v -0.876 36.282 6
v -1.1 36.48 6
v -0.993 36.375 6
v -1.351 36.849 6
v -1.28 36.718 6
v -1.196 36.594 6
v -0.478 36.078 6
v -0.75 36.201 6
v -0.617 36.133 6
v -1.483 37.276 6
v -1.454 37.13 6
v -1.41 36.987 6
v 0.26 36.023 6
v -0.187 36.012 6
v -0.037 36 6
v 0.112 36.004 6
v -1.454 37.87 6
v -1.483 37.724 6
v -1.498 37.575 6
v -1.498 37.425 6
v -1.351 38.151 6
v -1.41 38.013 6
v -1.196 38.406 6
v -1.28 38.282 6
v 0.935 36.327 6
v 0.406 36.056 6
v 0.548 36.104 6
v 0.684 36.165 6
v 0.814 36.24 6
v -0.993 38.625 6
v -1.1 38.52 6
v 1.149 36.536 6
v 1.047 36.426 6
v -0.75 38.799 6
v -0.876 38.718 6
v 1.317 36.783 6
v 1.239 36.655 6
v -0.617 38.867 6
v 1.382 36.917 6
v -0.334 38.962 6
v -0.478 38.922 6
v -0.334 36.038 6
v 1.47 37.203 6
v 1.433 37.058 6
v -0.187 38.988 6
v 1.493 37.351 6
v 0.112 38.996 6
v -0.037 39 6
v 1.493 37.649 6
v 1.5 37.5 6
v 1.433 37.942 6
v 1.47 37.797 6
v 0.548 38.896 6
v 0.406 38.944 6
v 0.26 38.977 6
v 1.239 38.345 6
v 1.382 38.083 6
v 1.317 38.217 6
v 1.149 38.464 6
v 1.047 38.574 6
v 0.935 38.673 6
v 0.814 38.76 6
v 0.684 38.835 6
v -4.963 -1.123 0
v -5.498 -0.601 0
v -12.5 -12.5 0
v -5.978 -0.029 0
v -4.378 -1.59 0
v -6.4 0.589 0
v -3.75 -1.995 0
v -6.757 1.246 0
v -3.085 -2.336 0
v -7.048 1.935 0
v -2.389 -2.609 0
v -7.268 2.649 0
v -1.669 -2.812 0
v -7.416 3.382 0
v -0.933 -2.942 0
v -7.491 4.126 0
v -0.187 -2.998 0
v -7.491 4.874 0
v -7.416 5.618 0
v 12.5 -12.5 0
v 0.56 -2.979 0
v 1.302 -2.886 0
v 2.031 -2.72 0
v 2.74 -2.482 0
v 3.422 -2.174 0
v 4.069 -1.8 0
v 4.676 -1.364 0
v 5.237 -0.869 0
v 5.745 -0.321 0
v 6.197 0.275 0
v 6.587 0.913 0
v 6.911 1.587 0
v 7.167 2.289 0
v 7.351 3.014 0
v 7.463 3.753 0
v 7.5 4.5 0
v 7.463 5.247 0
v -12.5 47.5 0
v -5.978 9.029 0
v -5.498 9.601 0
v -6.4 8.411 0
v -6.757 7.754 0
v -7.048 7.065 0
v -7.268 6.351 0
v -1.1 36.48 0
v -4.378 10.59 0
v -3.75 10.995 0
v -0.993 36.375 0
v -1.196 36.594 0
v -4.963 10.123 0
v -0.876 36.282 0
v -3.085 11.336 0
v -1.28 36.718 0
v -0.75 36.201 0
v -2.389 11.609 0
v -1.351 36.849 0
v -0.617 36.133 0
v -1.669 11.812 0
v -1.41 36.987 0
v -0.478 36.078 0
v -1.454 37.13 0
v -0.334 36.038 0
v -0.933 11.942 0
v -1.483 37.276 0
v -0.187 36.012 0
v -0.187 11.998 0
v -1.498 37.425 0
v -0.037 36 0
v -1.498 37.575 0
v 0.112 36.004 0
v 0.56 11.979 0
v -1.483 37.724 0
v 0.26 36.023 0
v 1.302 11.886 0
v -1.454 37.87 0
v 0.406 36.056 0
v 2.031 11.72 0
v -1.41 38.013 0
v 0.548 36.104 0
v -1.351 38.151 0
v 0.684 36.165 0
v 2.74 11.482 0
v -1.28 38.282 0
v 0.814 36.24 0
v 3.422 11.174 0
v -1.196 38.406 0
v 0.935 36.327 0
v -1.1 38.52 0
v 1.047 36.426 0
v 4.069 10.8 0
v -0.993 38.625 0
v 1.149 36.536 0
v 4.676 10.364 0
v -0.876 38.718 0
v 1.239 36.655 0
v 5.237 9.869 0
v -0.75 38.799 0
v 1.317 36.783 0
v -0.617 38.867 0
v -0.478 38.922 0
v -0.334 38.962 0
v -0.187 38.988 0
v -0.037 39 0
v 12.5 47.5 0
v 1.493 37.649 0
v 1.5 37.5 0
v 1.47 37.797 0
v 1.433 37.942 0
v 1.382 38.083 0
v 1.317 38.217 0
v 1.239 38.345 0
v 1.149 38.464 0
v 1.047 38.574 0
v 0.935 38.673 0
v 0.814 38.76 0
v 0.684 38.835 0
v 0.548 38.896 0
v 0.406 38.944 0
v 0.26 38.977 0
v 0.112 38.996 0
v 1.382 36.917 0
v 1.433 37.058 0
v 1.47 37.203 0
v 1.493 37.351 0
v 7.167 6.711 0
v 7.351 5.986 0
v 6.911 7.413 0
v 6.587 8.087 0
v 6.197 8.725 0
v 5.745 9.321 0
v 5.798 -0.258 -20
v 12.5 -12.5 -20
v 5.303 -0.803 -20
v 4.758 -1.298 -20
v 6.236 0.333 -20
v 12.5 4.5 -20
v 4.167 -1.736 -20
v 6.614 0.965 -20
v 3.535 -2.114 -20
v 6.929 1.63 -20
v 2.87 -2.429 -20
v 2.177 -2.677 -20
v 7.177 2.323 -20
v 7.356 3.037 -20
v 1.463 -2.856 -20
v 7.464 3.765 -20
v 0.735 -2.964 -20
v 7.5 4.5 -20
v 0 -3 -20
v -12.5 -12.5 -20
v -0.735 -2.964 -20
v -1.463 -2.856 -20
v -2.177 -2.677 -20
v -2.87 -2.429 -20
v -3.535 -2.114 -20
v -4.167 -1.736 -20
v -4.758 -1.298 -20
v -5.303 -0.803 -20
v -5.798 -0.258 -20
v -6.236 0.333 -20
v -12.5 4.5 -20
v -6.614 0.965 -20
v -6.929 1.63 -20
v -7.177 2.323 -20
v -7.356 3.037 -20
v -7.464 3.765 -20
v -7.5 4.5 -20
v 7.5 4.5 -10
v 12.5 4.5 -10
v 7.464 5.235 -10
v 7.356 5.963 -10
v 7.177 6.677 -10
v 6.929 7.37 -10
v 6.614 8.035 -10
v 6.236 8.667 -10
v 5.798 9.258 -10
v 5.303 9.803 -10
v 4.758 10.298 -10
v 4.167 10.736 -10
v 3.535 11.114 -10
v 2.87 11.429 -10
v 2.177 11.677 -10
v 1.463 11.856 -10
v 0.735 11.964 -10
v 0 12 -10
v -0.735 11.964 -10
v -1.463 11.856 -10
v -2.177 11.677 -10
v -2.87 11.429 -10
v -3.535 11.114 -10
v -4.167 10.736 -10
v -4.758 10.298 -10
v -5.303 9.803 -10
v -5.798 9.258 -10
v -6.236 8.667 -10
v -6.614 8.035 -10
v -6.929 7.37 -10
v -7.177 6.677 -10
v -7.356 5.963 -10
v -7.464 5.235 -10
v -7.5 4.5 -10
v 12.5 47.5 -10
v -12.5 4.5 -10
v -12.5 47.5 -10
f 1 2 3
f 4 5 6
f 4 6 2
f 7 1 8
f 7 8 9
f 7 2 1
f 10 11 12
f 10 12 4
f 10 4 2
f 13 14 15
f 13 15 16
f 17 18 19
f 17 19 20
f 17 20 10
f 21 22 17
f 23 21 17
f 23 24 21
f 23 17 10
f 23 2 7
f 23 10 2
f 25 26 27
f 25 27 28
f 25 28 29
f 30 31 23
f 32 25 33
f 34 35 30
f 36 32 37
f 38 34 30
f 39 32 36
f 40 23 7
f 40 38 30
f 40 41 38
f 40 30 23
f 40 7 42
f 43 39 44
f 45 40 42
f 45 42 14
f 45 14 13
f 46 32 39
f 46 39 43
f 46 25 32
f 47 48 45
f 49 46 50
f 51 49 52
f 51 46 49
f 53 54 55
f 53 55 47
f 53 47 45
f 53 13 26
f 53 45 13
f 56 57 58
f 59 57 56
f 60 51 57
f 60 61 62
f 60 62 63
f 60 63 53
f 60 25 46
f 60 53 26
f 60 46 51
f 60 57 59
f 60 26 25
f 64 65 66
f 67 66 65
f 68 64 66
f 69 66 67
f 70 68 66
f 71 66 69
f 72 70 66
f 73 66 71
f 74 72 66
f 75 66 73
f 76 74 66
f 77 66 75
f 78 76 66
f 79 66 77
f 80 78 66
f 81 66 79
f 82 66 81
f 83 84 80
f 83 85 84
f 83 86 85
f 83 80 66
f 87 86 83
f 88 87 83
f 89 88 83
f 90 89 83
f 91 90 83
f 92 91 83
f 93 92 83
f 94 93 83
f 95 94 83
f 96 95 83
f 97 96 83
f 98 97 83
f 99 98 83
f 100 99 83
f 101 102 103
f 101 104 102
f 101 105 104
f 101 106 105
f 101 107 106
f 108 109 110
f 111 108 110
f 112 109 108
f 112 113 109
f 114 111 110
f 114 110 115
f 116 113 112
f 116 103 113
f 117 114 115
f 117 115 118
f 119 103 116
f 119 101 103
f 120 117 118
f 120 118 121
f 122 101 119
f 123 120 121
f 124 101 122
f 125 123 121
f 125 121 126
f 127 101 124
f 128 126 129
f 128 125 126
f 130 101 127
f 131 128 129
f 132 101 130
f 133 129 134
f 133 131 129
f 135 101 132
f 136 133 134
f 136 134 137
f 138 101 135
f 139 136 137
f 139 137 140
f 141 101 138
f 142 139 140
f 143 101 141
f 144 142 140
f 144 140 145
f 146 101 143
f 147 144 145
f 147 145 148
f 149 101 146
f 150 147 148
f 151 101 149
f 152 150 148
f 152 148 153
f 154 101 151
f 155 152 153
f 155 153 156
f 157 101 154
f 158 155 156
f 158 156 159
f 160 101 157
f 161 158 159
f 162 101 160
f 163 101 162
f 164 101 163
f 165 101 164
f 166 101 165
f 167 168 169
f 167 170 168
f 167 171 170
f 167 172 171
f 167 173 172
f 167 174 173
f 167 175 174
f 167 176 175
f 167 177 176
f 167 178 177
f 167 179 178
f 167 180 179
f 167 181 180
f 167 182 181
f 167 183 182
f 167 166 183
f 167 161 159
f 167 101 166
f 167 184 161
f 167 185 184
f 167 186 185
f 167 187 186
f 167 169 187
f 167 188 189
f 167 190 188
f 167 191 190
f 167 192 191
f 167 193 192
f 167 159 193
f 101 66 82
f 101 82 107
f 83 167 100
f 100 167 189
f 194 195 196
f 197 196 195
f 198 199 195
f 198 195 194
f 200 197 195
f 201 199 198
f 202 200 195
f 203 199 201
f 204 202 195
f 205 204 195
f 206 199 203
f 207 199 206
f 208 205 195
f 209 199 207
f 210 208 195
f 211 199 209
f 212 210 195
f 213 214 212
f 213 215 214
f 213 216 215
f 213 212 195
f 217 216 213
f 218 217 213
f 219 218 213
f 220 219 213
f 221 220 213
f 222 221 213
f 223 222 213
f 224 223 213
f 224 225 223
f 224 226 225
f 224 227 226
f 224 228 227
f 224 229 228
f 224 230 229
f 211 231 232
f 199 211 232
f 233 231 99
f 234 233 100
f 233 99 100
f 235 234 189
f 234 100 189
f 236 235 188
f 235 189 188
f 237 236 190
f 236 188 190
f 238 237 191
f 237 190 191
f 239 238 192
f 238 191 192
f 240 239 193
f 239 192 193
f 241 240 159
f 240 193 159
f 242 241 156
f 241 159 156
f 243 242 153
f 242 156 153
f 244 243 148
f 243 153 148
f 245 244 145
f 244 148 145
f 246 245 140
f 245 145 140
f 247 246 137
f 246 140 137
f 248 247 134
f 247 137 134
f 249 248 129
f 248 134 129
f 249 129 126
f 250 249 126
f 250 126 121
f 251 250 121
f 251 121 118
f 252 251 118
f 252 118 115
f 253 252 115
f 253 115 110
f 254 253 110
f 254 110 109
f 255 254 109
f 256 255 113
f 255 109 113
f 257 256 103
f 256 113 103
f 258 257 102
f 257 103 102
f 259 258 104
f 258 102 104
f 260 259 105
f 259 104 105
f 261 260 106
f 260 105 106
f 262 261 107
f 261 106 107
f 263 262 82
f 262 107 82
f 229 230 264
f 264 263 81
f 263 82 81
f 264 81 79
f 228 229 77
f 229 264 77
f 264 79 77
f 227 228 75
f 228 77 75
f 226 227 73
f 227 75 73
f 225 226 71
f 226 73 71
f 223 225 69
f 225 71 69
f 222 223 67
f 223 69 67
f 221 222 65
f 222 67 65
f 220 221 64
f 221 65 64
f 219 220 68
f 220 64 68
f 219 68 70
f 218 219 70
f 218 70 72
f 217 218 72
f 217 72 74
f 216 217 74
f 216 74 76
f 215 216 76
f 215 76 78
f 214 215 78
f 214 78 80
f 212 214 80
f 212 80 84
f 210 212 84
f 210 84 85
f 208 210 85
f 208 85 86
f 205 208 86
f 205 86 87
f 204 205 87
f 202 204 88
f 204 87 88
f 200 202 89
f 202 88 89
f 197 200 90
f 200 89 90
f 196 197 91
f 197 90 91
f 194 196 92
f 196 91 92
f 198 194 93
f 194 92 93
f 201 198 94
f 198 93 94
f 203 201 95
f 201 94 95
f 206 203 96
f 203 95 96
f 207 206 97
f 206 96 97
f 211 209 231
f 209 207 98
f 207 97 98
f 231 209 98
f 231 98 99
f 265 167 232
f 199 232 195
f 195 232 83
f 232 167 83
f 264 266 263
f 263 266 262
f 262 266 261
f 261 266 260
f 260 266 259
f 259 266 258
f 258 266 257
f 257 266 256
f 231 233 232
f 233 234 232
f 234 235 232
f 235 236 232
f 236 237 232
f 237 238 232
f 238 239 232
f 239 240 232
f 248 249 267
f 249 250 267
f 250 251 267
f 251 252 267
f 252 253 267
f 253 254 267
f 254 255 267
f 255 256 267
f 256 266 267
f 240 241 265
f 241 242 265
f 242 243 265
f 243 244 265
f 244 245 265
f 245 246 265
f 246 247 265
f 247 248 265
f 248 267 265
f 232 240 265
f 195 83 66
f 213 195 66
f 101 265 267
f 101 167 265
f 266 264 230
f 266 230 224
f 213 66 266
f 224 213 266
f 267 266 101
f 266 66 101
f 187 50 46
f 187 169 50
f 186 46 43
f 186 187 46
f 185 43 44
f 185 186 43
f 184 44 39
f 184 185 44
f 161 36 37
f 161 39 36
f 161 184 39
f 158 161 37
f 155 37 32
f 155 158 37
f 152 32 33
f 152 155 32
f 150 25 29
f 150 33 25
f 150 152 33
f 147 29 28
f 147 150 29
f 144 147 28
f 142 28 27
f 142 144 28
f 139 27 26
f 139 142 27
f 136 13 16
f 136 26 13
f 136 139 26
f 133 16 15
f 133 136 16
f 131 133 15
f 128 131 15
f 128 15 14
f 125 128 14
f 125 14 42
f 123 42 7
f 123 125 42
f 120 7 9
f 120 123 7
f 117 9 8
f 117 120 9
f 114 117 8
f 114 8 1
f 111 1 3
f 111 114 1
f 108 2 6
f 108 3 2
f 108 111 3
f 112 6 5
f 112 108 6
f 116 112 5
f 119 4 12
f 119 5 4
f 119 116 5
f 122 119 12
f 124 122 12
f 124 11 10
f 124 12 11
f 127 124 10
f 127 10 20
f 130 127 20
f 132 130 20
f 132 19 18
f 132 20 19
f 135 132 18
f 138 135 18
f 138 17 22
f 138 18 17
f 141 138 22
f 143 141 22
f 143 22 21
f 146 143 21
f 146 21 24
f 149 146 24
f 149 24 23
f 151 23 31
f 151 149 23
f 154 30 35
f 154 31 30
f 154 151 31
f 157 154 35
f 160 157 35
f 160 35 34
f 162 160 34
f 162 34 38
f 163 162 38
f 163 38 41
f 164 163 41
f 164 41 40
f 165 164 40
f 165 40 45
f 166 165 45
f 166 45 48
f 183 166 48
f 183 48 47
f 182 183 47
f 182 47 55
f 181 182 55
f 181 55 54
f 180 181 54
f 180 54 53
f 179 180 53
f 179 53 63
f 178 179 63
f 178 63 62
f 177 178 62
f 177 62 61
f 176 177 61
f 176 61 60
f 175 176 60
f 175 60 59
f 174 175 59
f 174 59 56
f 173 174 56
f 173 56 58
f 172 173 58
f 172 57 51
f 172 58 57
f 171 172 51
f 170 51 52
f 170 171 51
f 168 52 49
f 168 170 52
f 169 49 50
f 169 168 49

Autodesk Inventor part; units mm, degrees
ref_plane "YZ Plane" through (0, 0, 0) normal (1, 0, 0) x (0, 1, 0)
ref_plane "XZ Plane" through (0, 0, 0) normal (0, 1, 0) x (-1, 0, 0)
ref_plane "XY Plane" through (0, 0, 0) normal (0, 0, 1) x (1, 0, 0)
sketch "Sketch1" plane through (0, 0, 0) normal (0, 0, 1) x (1, 0, 0)
  line L0 (-12.5, -12.5) -> (12.5, -12.5)
  line L1 (12.5, -12.5) -> (12.5, 47.5)
  line L2 (12.5, 47.5) -> (-12.5, 47.5)
  line L3 (-12.5, 47.5) -> (-12.5, -12.5)
  point P0 (0, 0)
  dimension "d0" = 60
  dimension "d1" = 25
  dimension "d2" = 12.5
  dimension "d5" = 12.5
extrude "Extrusion1" add sketch "Sketch1" against normal blind 10
sketch "Sketch2" plane through (0, 0, 0) normal (0, 0, 1) x (1, 0, 0)
  circle A0 centre (0, 37.5) radius 1.5
  point P0 (0, 0)
  dimension "d8" = 3
  dimension "d29" = 37.5
extrude "Extrusion2" add sketch "Sketch2" along normal blind 6
thread "Thread1" size "M3x0.5" class "6g" standard "ANSI Metric M Profile" full length
sketch "Sketch3" plane through (0, 0, -10) normal (0, 0, -1) x (-1, 0, 0)
  line L0 (-7.5, 4.5) -> (-12.5, 4.5)
  line L1 (-12.5, 47.5) -> (-12.5, -12.5) projected
  line L2 (-12.5, -12.5) -> (12.5, -12.5) projected
  line L3 (-12.5, -12.5) -> (12.5, -12.5)
  line L4 (12.5, -12.5) -> (12.5, 4.5)
  line L5 (12.5, -12.5) -> (12.5, 47.5) projected
  line L6 (7.5, 4.5) -> (12.5, 4.5)
  arc A0 (-7.5, 4.5) -> (7.5, 4.5) centre (0, 4.5) ccw
  point P0 (0, 0)
  dimension "d20" = 17
  dimension "d21" = 5
  dimension "d22" = 5
  dimension "d25" = 7.5
extrude "Extrusion3" add sketch "Sketch3" along normal blind 10
sketch "Sketch5" plane through (0, 0, 0) normal (0, 0, 1) x (1, 0, 0)
  circle A0 centre (0, 4.5) radius 7.5
  point P0 (0, 0)
  dimension "d26" = 15
extrude "Extrusion5" cut sketch "Sketch5" against normal blind 10
equation "\"d2\" = 0.5 * d1"
properties part number "bottom_part"
